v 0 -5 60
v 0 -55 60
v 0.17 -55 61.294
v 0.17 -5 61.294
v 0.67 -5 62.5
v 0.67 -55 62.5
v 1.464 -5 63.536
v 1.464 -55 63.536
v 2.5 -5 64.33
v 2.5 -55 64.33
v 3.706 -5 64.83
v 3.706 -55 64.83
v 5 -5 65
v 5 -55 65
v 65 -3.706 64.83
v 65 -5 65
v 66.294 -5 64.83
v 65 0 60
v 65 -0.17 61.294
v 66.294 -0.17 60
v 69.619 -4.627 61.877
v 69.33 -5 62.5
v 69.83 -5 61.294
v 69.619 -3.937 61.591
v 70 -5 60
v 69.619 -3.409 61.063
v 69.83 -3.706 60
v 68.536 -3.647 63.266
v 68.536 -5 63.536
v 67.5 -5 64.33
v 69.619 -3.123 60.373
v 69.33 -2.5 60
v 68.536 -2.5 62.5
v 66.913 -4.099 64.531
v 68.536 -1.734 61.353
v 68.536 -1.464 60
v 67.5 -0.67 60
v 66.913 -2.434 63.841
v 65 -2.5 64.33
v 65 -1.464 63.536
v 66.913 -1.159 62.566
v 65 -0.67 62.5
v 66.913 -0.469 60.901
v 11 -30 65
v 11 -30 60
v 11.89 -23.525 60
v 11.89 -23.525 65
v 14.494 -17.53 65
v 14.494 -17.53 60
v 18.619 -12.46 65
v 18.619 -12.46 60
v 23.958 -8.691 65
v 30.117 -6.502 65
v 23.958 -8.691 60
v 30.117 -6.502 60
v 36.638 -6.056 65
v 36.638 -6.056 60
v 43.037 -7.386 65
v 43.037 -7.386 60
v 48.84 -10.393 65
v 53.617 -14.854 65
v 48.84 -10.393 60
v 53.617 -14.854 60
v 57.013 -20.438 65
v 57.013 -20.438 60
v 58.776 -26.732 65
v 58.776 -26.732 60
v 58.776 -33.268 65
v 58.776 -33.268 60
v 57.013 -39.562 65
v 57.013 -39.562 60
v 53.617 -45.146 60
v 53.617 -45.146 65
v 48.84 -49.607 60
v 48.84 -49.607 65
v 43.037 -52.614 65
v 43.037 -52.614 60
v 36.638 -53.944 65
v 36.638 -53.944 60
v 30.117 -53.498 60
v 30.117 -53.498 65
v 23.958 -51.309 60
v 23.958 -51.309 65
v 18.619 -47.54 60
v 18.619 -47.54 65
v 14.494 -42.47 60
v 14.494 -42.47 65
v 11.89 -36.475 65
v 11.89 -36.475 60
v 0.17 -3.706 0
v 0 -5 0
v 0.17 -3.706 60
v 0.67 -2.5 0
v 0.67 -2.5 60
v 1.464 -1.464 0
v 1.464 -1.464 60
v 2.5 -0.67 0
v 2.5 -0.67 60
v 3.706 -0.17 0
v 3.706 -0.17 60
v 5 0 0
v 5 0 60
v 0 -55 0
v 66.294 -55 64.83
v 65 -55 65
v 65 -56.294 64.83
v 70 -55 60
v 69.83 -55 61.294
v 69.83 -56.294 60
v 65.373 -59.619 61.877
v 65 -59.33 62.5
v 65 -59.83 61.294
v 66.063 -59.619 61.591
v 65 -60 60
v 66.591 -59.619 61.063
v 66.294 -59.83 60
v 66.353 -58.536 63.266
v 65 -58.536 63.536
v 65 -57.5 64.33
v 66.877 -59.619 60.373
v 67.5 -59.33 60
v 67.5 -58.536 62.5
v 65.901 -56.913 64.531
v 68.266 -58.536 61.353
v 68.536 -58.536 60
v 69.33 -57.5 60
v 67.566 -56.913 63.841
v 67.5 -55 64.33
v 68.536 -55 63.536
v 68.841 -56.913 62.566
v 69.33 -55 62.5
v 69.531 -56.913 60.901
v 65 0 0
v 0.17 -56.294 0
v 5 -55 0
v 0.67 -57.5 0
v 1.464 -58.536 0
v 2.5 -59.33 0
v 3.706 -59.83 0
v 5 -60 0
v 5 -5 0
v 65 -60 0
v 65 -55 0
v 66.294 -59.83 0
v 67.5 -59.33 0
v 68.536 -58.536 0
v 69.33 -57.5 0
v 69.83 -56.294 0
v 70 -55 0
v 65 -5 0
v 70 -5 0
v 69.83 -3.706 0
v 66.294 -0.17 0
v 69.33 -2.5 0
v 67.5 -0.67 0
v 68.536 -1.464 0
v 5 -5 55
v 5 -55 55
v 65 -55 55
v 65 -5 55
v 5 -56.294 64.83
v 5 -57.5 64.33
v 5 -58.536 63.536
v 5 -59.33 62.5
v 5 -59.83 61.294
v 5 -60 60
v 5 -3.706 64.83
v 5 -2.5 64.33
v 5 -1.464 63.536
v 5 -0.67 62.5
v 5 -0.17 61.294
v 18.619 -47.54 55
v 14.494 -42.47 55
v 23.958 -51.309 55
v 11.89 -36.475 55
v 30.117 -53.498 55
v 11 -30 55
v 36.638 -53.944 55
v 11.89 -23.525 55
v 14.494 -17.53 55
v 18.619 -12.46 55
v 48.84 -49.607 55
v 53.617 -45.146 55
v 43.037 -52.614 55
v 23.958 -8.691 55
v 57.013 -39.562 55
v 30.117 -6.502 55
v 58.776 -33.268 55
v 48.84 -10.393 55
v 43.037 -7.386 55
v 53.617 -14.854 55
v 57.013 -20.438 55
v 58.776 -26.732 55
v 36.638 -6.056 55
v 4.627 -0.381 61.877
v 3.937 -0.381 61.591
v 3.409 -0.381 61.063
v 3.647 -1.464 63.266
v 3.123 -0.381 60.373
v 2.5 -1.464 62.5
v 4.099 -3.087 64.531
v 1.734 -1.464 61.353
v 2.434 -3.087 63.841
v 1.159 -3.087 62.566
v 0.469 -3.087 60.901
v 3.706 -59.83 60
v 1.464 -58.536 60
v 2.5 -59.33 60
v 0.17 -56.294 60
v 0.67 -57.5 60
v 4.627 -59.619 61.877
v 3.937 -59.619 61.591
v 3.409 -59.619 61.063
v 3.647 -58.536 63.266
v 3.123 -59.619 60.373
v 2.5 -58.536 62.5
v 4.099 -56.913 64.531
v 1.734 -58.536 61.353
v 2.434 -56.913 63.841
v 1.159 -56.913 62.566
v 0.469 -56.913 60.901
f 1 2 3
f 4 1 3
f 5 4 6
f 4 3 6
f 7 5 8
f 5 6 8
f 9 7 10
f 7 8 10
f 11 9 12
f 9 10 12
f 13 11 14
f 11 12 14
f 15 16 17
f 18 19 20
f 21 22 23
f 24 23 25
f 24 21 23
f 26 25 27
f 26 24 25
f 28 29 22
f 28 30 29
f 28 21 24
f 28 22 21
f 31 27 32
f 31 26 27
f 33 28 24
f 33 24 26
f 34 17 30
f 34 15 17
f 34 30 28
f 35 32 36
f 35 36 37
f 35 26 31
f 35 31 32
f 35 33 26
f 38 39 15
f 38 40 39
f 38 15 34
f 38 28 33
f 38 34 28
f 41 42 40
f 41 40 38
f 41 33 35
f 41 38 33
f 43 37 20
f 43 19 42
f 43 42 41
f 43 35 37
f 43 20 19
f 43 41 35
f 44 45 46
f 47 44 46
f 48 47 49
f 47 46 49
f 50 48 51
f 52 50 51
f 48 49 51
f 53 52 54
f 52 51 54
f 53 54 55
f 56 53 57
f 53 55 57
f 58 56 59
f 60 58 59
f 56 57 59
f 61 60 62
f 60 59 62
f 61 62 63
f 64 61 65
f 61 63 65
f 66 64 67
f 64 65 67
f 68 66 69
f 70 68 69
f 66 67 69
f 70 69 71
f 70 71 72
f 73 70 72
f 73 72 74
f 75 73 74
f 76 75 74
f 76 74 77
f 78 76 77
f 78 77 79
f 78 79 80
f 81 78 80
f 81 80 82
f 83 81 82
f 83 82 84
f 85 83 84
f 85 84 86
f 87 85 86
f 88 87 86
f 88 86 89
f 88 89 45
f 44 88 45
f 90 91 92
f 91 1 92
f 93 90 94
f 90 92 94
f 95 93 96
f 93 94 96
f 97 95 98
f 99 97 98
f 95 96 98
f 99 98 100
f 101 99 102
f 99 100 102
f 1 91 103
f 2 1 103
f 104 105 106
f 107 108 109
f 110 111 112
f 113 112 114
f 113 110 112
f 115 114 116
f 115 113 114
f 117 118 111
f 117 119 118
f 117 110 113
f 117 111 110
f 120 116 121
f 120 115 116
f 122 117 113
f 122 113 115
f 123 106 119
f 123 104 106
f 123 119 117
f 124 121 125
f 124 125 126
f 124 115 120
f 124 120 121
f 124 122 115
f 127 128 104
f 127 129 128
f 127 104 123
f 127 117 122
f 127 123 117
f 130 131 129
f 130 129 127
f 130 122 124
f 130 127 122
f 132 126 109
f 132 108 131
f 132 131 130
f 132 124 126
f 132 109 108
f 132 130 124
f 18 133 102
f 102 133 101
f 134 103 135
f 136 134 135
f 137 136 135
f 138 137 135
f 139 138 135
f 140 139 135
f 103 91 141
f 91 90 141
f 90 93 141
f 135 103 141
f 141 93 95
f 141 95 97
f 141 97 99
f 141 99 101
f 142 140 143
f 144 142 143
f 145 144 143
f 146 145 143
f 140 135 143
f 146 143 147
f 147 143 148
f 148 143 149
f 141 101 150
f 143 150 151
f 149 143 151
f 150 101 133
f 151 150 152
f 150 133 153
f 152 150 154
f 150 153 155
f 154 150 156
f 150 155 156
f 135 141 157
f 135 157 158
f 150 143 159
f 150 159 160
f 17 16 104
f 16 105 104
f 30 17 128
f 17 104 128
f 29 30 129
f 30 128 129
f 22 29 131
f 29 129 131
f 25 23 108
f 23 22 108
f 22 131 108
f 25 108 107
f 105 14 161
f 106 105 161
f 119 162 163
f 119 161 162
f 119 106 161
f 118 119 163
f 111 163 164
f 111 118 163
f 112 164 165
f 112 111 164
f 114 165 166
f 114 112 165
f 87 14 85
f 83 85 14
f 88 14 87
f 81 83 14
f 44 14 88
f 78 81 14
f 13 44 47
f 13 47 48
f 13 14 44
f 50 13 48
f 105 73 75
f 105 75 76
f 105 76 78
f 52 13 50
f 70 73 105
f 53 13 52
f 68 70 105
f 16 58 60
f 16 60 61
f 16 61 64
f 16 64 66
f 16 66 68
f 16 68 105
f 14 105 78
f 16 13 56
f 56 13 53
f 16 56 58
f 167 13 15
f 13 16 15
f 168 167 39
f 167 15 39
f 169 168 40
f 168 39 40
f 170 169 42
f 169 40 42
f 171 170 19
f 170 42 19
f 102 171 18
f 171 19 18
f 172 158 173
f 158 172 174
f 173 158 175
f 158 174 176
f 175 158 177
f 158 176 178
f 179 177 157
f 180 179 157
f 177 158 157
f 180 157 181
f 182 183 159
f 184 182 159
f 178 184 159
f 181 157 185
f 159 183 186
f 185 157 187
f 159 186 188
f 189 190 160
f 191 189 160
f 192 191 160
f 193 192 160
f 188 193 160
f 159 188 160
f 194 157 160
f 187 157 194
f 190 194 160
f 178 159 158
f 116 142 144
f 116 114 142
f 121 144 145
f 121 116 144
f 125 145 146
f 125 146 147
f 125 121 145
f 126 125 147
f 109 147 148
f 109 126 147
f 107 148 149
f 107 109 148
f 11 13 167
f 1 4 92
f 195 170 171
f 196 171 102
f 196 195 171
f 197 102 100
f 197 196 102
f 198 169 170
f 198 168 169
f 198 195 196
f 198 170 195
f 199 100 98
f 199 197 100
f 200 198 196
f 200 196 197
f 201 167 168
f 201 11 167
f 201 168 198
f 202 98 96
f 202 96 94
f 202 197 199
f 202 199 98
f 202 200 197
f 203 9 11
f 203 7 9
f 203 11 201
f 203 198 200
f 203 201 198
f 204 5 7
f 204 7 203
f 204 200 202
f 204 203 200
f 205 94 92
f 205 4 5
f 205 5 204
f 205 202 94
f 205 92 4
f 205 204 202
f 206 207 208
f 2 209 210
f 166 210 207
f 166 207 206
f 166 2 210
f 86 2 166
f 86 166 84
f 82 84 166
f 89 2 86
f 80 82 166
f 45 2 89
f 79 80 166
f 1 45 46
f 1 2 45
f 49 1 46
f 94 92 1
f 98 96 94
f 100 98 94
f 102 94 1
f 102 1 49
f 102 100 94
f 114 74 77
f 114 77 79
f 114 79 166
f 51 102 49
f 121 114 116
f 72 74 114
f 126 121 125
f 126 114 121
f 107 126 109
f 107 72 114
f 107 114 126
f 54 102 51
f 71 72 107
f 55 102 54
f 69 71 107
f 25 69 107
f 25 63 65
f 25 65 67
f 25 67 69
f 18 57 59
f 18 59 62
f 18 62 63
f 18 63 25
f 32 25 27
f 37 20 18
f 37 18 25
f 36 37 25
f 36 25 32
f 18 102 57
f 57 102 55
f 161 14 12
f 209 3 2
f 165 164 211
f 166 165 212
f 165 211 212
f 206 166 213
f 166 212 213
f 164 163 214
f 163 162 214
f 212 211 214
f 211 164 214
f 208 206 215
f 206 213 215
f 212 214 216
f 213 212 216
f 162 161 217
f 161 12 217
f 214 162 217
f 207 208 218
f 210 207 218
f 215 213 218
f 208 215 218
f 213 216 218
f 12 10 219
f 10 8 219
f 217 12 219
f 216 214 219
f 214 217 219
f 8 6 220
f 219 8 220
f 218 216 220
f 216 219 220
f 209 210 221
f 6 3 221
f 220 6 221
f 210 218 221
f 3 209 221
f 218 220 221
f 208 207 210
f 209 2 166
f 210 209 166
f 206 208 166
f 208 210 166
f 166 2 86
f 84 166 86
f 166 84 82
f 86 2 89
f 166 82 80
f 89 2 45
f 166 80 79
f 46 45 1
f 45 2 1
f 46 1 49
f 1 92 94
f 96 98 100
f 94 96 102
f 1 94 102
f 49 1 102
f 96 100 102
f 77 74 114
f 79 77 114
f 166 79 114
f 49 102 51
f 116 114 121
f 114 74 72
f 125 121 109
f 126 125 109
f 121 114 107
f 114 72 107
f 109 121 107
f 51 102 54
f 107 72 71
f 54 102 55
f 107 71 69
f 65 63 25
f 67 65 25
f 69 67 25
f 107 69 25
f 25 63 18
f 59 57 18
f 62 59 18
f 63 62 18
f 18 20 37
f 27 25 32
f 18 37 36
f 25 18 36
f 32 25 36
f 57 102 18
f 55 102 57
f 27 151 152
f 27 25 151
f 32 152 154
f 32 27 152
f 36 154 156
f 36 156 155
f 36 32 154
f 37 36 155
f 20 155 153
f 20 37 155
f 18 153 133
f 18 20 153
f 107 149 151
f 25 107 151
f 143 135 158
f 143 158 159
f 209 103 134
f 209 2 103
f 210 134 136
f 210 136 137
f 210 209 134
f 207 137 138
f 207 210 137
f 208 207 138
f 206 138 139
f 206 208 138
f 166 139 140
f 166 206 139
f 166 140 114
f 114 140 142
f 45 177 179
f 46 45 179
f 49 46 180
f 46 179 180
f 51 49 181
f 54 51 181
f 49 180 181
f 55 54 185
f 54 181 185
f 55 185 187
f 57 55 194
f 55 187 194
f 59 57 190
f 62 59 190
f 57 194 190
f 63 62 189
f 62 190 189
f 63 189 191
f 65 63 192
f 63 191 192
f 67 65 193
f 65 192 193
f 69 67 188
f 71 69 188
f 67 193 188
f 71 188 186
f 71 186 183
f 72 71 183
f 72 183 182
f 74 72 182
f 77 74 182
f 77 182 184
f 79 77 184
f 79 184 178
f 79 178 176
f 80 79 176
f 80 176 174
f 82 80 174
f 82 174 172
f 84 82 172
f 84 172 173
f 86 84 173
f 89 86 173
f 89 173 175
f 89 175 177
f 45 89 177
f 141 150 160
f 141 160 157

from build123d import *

# Parameters (mm, degrees)
F1_DEPTH = 60
F2_W     = 70
F2_H     = 5
F3_DEPTH = 60
F5_D     = 48
F6_R     = 4.99999
F6_2_R   = 4.99999
F7_T     = 5
F8_D     = 48


# Not quite as in the source:
# - a fillet or chamfer is up to 0.001 mm smaller than in the source, because OpenCascade refuses the exact size
# - a shell that OpenCascade refuses in one call is made with other operations: the cavity is built on its own and cut out
# - a feature names something its author has since deleted; it is built from what else it names


with BuildPart() as f1:
    # F0 (on Top) → F1 (new body)
    with BuildSketch(Plane.XY):
        Polygon((10, 0), (0, 0), (0, -10), (0, -50), (0, -60), (10, -60), (60, -60), (70, -60), (70, -50), (70, -10), (70, 0), (60, 0), align=None)
    extrude(amount=F1_DEPTH)

    # F6#2 (radius 5 in the source; OpenCascade refuses exactly that, so slightly less here)
    f6_2_edges = [f1.edges().sort_by_distance(p)[0] for p in [
        (0, -60, 30),
        (70, -60, 30),
        (70, 0, 30),
        (0, 0, 30),
    ]]
    fillet(f6_2_edges, radius=F6_2_R)

    # F7: shell of thickness 5, made by hand


with BuildPart() as f3:
    # F2 (on Front) → F3 (new body)
    with BuildSketch(Plane.XZ):
        with Locations((35, 62.5)):
            Rectangle(F2_W, F2_H)
    extrude(amount=F3_DEPTH)

    # F5 (through all)
    with Locations(Plane.XY.offset(65)):
        with Locations((35, -30)):
            Hole(F5_D / 2)

    # F6 (radius 5 in the source; OpenCascade refuses exactly that, so slightly less here)
    f6_edges = [f3.edges().sort_by_distance(p)[0] for p in [
        (0, -30, 65),
        (35, 0, 65),
        (70, -30, 65),
        (35, -60, 65),
        (0, 0, 62.5),
        (0, -60, 62.5),
        (70, 0, 62.5),
        (70, -60, 62.5),
    ]]
    fillet(f6_edges, radius=F6_R)


with BuildPart() as f7_core1:
    # F7_t2: copy of F1
    add(f1.part)

    # the walls: a layer under each face that stays
    f7_faces = [f7_core1.faces().sort_by_distance(p)[0] for p in [
        (35, 0, 30),
        (35, -30, 60),
        (0, -30, 30),
        (35, -60, 30),
        (70, -30, 30),
    ]]
    thicken(f7_faces, amount=-F7_T, mode=Mode.SUBTRACT)


with BuildPart() as f1_1:
    add(f1.part)

    # what is left inside the walls is the cavity
    f7_cavity = [f7_core1.part.solids().sort_by_distance(p)[0] for p in [
        (35, -5.05, 36.666667),
    ]]
    add(f7_cavity, mode=Mode.SUBTRACT)

    # F8 (through all)
    with Locations(Plane.XY.offset(65)):
        with Locations((35, -30)):
            Hole(F8_D / 2)


solid = Compound([f3.part, f1_1.part])
